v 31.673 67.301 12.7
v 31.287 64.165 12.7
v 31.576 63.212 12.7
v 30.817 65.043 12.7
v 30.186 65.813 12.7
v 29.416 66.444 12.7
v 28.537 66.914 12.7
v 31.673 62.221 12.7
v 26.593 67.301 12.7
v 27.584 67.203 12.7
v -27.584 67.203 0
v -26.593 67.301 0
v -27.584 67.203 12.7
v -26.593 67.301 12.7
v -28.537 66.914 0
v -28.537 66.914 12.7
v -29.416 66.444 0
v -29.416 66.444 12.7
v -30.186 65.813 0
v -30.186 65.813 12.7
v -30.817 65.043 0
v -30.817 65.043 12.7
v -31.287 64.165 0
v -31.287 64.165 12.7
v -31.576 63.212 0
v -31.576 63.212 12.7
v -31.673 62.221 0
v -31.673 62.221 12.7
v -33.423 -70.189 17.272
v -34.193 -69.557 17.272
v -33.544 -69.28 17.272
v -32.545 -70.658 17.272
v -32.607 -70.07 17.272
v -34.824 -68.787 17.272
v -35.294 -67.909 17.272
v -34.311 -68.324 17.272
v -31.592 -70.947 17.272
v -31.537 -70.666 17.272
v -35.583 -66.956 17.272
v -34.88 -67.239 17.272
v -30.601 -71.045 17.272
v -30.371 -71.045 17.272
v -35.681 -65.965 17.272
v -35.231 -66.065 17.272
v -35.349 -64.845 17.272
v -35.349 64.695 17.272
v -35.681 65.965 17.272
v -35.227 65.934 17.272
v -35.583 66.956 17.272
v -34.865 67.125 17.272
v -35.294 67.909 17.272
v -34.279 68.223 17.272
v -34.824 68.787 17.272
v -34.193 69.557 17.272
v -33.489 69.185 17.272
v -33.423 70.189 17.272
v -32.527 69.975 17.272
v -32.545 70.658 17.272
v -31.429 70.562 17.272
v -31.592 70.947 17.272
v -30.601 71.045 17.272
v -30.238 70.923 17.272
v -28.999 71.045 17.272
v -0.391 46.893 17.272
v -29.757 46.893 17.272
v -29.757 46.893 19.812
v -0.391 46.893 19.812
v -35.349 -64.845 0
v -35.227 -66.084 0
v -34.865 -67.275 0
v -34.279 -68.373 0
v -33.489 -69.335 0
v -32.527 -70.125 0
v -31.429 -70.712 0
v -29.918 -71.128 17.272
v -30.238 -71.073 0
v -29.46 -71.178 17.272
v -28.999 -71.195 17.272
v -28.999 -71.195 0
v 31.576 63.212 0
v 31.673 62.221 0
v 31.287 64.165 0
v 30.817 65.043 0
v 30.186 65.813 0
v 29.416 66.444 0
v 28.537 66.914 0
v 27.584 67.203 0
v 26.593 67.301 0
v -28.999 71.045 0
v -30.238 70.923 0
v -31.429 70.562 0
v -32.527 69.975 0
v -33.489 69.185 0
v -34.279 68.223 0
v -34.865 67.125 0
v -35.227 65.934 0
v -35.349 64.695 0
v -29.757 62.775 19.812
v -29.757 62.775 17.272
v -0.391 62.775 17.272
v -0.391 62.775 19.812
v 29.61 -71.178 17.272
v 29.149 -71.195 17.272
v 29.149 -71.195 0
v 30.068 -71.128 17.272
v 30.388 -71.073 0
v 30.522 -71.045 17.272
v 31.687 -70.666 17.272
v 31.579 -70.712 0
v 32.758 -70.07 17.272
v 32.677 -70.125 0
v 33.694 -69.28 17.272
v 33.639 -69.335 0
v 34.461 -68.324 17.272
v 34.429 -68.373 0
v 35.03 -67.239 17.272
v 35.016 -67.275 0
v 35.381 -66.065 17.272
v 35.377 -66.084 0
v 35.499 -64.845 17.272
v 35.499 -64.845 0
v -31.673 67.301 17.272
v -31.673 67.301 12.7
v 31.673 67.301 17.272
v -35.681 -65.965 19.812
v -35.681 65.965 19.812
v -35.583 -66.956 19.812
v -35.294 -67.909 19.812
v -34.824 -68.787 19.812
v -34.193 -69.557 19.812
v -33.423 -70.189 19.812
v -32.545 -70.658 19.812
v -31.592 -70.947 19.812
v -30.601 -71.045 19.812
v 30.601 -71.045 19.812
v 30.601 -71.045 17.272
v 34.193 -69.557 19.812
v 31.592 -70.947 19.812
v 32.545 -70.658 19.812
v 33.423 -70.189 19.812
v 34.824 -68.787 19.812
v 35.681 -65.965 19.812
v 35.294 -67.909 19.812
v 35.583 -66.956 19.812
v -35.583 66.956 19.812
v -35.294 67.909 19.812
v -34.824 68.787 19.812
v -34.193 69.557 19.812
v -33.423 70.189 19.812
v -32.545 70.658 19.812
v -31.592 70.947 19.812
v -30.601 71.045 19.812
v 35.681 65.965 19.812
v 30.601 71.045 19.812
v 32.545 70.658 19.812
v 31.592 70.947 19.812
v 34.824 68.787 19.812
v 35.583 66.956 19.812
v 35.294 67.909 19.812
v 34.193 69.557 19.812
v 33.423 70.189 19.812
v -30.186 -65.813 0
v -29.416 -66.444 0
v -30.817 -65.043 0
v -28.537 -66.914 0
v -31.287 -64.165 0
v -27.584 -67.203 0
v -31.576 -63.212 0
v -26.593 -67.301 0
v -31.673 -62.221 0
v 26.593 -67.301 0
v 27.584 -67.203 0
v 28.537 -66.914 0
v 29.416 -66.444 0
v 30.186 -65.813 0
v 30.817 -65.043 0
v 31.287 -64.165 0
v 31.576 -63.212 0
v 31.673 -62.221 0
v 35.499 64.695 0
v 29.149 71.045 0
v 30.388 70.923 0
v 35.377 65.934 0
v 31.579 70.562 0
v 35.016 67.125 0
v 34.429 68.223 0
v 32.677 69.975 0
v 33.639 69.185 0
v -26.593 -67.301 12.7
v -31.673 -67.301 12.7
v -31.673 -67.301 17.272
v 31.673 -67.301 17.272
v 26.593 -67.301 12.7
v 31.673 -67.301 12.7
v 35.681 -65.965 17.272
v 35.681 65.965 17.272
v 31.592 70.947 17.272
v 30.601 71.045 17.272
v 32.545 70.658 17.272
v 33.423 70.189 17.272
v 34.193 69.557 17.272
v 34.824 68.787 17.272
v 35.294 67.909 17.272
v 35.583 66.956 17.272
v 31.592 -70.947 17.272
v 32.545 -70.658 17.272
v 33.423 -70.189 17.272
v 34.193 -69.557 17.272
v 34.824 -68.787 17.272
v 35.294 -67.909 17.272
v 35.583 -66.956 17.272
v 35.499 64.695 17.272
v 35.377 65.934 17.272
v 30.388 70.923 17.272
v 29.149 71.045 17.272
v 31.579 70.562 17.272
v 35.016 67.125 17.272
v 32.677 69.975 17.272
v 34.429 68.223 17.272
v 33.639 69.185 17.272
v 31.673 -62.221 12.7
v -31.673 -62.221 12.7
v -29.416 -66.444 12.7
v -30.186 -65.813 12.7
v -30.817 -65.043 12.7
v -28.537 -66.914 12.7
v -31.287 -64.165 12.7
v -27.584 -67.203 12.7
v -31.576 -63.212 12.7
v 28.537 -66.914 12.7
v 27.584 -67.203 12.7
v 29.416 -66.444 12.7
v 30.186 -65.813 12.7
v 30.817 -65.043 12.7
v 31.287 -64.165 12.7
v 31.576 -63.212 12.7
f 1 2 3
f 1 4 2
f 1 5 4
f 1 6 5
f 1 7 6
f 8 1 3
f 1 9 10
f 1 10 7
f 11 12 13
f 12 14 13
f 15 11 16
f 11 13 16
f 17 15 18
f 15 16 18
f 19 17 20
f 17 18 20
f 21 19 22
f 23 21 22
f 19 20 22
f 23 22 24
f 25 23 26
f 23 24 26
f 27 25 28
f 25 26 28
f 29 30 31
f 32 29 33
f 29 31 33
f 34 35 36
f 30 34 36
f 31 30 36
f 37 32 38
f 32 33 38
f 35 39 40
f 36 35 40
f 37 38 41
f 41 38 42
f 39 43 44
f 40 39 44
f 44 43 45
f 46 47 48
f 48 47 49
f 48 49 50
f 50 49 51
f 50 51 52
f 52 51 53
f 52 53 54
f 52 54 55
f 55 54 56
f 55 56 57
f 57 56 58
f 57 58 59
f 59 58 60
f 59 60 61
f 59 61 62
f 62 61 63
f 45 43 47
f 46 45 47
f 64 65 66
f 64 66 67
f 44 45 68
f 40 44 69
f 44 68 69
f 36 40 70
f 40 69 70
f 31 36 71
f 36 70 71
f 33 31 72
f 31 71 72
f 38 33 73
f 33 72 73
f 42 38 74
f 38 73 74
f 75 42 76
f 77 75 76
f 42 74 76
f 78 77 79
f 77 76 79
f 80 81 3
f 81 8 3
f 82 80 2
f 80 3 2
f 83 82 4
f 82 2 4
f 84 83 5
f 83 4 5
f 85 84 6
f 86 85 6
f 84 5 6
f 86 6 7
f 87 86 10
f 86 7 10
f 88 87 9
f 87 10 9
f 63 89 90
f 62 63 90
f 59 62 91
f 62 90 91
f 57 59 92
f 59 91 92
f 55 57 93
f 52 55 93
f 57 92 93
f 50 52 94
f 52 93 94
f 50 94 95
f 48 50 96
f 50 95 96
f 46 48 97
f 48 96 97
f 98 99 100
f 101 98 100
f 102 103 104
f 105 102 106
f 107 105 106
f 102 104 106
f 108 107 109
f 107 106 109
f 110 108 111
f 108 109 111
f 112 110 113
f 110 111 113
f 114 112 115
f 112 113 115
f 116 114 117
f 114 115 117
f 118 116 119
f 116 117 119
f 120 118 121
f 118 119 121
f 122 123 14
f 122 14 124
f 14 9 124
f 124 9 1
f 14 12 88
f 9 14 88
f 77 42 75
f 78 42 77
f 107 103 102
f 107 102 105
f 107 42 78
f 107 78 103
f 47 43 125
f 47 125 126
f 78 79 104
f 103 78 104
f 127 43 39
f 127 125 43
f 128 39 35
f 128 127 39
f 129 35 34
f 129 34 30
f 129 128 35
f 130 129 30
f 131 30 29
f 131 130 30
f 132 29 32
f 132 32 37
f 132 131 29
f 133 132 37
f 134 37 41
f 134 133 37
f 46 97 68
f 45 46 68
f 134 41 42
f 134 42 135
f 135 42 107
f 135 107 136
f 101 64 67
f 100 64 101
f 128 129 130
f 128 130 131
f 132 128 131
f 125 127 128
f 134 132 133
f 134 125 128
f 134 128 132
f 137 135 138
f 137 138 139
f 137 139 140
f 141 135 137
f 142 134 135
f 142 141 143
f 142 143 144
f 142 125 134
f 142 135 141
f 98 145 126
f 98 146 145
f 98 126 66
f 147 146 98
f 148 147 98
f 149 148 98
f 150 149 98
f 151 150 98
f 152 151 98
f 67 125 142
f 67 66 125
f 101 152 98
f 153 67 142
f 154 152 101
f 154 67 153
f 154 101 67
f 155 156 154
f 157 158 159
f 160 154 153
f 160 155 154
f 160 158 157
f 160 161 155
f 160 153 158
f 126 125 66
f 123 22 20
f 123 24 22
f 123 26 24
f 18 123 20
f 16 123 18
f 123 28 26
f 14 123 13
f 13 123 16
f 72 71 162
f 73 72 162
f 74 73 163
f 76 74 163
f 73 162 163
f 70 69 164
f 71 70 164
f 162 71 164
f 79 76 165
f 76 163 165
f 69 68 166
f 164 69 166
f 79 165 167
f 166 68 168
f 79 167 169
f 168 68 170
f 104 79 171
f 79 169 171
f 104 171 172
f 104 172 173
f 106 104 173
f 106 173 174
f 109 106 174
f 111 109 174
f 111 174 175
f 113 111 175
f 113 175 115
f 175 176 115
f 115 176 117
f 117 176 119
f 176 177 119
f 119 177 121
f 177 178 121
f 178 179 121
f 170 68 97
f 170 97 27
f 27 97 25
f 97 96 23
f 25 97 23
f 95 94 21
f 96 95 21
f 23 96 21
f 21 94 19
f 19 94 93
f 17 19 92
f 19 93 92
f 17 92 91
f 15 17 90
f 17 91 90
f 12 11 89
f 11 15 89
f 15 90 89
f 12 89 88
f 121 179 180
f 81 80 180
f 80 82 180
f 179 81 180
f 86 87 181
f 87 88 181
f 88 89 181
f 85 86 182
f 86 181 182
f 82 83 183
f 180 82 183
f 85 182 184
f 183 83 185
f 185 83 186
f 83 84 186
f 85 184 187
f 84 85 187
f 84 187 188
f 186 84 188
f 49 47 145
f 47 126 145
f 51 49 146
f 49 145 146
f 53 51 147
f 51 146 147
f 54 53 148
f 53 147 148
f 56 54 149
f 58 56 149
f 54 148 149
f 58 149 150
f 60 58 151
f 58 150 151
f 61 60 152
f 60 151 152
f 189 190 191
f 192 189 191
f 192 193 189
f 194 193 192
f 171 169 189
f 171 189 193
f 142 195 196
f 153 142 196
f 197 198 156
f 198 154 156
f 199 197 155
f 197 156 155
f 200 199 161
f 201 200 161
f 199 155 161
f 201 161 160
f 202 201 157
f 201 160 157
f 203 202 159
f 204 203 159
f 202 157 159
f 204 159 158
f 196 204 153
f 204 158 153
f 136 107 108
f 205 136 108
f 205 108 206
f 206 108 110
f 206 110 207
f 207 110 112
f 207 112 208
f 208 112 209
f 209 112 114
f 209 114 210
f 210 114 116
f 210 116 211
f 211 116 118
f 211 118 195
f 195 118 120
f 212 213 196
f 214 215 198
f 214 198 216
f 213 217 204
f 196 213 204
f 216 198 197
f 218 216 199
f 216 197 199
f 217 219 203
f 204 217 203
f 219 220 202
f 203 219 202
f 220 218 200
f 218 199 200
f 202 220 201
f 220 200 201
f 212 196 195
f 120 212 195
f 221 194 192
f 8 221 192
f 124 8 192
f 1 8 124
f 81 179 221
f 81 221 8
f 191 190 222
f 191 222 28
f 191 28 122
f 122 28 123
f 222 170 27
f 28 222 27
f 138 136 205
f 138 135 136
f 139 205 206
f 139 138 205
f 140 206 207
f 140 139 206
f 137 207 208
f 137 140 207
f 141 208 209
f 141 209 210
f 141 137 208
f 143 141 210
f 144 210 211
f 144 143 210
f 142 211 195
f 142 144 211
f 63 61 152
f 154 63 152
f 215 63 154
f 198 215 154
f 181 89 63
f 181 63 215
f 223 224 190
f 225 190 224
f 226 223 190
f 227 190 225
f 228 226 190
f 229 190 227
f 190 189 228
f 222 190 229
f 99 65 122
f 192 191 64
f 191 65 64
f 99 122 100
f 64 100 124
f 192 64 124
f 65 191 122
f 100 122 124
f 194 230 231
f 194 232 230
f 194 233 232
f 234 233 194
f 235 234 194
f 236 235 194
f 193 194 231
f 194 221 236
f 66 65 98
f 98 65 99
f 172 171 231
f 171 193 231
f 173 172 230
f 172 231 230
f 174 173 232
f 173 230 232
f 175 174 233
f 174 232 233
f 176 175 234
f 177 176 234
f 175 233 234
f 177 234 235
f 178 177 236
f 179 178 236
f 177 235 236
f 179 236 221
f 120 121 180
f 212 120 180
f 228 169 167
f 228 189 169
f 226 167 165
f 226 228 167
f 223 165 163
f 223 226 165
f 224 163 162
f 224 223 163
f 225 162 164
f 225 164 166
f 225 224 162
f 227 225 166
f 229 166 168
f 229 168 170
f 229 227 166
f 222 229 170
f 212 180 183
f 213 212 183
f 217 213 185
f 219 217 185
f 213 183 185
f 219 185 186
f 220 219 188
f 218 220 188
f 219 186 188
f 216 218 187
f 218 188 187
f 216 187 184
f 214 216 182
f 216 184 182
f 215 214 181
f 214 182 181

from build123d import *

# Parameters (mm, degrees)
F0_W     = 63.346878
F0_H     = 134.601146
F1_DEPTH = 12.7
F2_R     = 5.08
F3_DEPTH = 17.272
F4_W     = 71.3612
F4_H     = 142.089878
F4_W_2   = 29.3665
F4_H_2   = 15.881453
F5_DEPTH = 2.54
F6_R     = 5.08


with BuildPart() as f1:
    # F0 (on Top) → F1 (new body)
    with BuildSketch(Plane.XY):
        with BuildLine():
            Line((29.148949, 71.044939), (-28.998831, 71.044939))
            ThreePointArc((-28.998831, 71.044939), (-33.488959, 69.185067), (-35.348831, 64.694939))
            Line((-35.348831, 64.694939), (-35.348831, -64.845061))
            ThreePointArc((-35.348831, -64.845061), (-33.488959, -69.335189), (-28.998831, -71.195061))
            Line((-28.998831, -71.195061), (29.148949, -71.195061))
            ThreePointArc((29.148949, -71.195061), (33.639077, -69.335189), (35.498949, -64.845061))
            Line((35.498949, -64.845061), (35.498949, 64.694939))
            ThreePointArc((35.498949, 64.694939), (33.639077, 69.185067), (29.148949, 71.044939))
        make_face()
        Rectangle(F0_W, F0_H, mode=Mode.SUBTRACT)
    extrude(amount=F1_DEPTH)

    # F2
    f2_edges = [f1.edges().sort_by_distance(p)[0] for p in [
        (-31.673439, 67.300573, 6.35),
        (31.673439, 67.300573, 6.35),
        (31.673439, -67.300573, 6.35),
        (-31.673439, -67.300573, 6.35),
    ]]
    fillet(f2_edges, radius=F2_R)

    # F0 (on Top) → F3 (join)
    with BuildSketch(Plane.XY):
        with BuildLine():
            Line((29.148949, 71.044939), (-28.998831, 71.044939))
            ThreePointArc((-28.998831, 71.044939), (-33.488959, 69.185067), (-35.348831, 64.694939))
            Line((-35.348831, 64.694939), (-35.348831, -64.845061))
            ThreePointArc((-35.348831, -64.845061), (-33.488959, -69.335189), (-28.998831, -71.195061))
            Line((-28.998831, -71.195061), (29.148949, -71.195061))
            ThreePointArc((29.148949, -71.195061), (33.639077, -69.335189), (35.498949, -64.845061))
            Line((35.498949, -64.845061), (35.498949, 64.694939))
            ThreePointArc((35.498949, 64.694939), (33.639077, 69.185067), (29.148949, 71.044939))
        make_face()
        Rectangle(F0_W, F0_H, mode=Mode.SUBTRACT)
    extrude(amount=F3_DEPTH)

    # F4 (on face) → F5 (join)
    with BuildSketch(Plane.XY.offset(17.272)):
        Rectangle(F4_W, F4_H)
        with Locations((-15.073998, 54.834136)):
            Rectangle(F4_W_2, F4_H_2, mode=Mode.SUBTRACT)
    extrude(amount=F5_DEPTH)

    # F6
    f6_edges = [f1.edges().sort_by_distance(p)[0] for p in [
        (-35.6806, 71.044939, 18.542),
        (35.6806, 71.044939, 18.542),
        (35.6806, -71.044939, 18.542),
        (-35.6806, -71.044939, 18.542),
    ]]
    fillet(f6_edges, radius=F6_R)


solid = f1.part
